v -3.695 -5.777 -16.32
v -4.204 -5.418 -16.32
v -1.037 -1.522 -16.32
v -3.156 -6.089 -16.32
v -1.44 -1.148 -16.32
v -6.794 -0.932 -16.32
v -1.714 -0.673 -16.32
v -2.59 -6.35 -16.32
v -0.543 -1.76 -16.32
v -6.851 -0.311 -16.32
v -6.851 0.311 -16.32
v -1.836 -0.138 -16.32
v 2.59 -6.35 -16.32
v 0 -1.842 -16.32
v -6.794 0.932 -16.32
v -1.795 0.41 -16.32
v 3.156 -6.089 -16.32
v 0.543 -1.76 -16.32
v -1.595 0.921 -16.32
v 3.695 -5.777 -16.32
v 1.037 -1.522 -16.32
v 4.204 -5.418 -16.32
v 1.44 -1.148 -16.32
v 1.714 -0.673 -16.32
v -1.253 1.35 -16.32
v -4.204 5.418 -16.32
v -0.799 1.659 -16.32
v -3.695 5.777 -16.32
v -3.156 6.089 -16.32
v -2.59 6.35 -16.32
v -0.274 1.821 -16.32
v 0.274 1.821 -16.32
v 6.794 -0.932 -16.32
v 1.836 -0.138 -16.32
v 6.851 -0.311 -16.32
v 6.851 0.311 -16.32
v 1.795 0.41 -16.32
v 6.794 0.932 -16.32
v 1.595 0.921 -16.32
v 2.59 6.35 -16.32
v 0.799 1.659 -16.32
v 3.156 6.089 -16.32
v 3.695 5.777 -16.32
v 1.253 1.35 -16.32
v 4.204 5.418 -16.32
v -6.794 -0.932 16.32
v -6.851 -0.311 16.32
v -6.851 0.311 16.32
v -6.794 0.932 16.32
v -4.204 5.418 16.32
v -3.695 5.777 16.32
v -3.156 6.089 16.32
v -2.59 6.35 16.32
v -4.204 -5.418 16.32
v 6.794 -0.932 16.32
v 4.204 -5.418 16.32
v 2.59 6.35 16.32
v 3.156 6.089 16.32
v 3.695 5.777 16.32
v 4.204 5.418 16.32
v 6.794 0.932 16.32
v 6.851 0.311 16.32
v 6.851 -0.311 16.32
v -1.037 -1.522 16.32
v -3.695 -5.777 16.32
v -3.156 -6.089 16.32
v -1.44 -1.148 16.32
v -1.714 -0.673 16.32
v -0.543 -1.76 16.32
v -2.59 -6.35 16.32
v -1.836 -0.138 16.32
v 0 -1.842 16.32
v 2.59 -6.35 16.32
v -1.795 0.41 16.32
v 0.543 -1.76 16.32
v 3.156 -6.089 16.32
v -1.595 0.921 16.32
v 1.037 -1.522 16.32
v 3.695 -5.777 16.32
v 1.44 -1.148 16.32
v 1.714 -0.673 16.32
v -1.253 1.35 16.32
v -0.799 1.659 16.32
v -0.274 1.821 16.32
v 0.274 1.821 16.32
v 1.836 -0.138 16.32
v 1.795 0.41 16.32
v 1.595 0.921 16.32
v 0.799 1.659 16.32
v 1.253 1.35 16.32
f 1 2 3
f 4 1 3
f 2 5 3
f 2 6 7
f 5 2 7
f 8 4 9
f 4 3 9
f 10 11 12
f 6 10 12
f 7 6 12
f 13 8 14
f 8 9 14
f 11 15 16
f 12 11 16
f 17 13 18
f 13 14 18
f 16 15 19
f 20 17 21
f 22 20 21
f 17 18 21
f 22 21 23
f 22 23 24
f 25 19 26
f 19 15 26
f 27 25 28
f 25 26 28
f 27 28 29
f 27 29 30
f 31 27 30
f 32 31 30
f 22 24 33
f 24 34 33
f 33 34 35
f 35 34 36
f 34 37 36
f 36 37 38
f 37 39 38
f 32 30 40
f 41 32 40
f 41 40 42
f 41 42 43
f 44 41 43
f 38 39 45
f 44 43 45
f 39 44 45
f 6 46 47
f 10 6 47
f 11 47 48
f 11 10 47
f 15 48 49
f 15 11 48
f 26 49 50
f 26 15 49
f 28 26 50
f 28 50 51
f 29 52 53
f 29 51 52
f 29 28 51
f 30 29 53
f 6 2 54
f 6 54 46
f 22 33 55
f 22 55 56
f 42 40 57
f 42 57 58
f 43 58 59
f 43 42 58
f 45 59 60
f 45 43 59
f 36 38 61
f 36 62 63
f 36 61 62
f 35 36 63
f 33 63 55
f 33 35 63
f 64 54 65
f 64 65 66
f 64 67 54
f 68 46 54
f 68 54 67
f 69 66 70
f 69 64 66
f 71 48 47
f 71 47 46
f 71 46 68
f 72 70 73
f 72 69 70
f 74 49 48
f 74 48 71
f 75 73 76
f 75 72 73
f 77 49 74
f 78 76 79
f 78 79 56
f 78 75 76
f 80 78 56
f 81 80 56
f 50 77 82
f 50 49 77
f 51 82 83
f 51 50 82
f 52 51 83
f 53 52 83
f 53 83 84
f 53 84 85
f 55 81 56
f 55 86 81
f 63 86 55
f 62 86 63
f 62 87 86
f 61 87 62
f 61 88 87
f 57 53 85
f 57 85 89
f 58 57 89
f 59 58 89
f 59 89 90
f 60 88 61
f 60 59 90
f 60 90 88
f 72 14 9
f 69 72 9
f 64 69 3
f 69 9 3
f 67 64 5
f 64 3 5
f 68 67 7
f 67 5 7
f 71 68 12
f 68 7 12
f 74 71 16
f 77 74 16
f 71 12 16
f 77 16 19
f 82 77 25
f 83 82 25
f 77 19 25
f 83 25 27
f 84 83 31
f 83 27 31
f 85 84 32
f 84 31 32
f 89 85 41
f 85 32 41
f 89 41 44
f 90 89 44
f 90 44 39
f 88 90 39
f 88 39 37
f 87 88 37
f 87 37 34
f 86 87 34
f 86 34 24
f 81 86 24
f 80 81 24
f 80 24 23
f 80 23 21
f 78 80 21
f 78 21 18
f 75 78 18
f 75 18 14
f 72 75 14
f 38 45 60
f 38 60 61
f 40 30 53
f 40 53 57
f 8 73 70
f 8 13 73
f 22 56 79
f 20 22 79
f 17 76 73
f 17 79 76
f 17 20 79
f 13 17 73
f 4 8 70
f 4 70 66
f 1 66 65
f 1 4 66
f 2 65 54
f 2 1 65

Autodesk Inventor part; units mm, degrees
ref_plane "YZ Plane" through (0, 0, 0) normal (1, 0, 0) x (0, 1, 0)
ref_plane "XZ Plane" through (0, 0, 0) normal (0, 1, 0) x (-1, 0, 0)
ref_plane "XY Plane" through (0, 0, 0) normal (0, 0, 1) x (1, 0, 0)
sketch "Sketch1" plane through (0, 0, 0) normal (0, 0, 1) x (1, 0, 0)
  line L0 (-3.6662, 6.35) -> (3.6662, 6.35)
  line L1 (3.6662, 6.35) -> (7.3323, 0)
  line L2 (7.3323, 0) -> (3.6662, -6.35)
  line L3 (3.6662, -6.35) -> (-3.6662, -6.35)
  line L4 (-3.6662, -6.35) -> (-7.3323, 0)
  line L5 (-7.3323, 0) -> (-3.6662, 6.35)
  circle A0 centre (0, 0) radius 6.858
  point P0 (2.5903, -6.35)
  point P1 (4.2041, -5.4183)
  point P2 (6.7944, -0.9317)
  point P3 (6.7944, 0.9317)
  point P4 (4.2041, 5.4183)
  point P5 (2.5903, 6.35)
  point P6 (-2.5903, 6.35)
  point P7 (-4.2041, 5.4183)
  point P8 (-6.7944, 0.9317)
  point P9 (-6.7944, -0.9317)
  point P10 (-4.2041, -5.4183)
  point P11 (-2.5903, -6.35)
  dimension "d0" = 12.7
  dimension "d1" = 13.716
extrude "Extrusion1" add sketch "Sketch1" along normal mid plane 32.639 contours L0 A0 L1 L2 L3 L4 L5
sketch "Sketch2" plane through (0, 0, 16.3195) normal (0, 0, 1) x (1, 0, 0)
  point P0 (0, 0)
hole "Hole1" at (0, 0, 16.3195) direction (0, 0, -1) diameter 3.683 end through all thread size "10-24 UNC" class "2B" standard "ANSI Unified Screw Threads"
mirror "Mirror1" about plane through (0, 0, 0) normal (0, 0, 1) of "Hole1"
properties part number "PINION_SHAFT_INTAKE" material "Aluminum, 7075-T6"
